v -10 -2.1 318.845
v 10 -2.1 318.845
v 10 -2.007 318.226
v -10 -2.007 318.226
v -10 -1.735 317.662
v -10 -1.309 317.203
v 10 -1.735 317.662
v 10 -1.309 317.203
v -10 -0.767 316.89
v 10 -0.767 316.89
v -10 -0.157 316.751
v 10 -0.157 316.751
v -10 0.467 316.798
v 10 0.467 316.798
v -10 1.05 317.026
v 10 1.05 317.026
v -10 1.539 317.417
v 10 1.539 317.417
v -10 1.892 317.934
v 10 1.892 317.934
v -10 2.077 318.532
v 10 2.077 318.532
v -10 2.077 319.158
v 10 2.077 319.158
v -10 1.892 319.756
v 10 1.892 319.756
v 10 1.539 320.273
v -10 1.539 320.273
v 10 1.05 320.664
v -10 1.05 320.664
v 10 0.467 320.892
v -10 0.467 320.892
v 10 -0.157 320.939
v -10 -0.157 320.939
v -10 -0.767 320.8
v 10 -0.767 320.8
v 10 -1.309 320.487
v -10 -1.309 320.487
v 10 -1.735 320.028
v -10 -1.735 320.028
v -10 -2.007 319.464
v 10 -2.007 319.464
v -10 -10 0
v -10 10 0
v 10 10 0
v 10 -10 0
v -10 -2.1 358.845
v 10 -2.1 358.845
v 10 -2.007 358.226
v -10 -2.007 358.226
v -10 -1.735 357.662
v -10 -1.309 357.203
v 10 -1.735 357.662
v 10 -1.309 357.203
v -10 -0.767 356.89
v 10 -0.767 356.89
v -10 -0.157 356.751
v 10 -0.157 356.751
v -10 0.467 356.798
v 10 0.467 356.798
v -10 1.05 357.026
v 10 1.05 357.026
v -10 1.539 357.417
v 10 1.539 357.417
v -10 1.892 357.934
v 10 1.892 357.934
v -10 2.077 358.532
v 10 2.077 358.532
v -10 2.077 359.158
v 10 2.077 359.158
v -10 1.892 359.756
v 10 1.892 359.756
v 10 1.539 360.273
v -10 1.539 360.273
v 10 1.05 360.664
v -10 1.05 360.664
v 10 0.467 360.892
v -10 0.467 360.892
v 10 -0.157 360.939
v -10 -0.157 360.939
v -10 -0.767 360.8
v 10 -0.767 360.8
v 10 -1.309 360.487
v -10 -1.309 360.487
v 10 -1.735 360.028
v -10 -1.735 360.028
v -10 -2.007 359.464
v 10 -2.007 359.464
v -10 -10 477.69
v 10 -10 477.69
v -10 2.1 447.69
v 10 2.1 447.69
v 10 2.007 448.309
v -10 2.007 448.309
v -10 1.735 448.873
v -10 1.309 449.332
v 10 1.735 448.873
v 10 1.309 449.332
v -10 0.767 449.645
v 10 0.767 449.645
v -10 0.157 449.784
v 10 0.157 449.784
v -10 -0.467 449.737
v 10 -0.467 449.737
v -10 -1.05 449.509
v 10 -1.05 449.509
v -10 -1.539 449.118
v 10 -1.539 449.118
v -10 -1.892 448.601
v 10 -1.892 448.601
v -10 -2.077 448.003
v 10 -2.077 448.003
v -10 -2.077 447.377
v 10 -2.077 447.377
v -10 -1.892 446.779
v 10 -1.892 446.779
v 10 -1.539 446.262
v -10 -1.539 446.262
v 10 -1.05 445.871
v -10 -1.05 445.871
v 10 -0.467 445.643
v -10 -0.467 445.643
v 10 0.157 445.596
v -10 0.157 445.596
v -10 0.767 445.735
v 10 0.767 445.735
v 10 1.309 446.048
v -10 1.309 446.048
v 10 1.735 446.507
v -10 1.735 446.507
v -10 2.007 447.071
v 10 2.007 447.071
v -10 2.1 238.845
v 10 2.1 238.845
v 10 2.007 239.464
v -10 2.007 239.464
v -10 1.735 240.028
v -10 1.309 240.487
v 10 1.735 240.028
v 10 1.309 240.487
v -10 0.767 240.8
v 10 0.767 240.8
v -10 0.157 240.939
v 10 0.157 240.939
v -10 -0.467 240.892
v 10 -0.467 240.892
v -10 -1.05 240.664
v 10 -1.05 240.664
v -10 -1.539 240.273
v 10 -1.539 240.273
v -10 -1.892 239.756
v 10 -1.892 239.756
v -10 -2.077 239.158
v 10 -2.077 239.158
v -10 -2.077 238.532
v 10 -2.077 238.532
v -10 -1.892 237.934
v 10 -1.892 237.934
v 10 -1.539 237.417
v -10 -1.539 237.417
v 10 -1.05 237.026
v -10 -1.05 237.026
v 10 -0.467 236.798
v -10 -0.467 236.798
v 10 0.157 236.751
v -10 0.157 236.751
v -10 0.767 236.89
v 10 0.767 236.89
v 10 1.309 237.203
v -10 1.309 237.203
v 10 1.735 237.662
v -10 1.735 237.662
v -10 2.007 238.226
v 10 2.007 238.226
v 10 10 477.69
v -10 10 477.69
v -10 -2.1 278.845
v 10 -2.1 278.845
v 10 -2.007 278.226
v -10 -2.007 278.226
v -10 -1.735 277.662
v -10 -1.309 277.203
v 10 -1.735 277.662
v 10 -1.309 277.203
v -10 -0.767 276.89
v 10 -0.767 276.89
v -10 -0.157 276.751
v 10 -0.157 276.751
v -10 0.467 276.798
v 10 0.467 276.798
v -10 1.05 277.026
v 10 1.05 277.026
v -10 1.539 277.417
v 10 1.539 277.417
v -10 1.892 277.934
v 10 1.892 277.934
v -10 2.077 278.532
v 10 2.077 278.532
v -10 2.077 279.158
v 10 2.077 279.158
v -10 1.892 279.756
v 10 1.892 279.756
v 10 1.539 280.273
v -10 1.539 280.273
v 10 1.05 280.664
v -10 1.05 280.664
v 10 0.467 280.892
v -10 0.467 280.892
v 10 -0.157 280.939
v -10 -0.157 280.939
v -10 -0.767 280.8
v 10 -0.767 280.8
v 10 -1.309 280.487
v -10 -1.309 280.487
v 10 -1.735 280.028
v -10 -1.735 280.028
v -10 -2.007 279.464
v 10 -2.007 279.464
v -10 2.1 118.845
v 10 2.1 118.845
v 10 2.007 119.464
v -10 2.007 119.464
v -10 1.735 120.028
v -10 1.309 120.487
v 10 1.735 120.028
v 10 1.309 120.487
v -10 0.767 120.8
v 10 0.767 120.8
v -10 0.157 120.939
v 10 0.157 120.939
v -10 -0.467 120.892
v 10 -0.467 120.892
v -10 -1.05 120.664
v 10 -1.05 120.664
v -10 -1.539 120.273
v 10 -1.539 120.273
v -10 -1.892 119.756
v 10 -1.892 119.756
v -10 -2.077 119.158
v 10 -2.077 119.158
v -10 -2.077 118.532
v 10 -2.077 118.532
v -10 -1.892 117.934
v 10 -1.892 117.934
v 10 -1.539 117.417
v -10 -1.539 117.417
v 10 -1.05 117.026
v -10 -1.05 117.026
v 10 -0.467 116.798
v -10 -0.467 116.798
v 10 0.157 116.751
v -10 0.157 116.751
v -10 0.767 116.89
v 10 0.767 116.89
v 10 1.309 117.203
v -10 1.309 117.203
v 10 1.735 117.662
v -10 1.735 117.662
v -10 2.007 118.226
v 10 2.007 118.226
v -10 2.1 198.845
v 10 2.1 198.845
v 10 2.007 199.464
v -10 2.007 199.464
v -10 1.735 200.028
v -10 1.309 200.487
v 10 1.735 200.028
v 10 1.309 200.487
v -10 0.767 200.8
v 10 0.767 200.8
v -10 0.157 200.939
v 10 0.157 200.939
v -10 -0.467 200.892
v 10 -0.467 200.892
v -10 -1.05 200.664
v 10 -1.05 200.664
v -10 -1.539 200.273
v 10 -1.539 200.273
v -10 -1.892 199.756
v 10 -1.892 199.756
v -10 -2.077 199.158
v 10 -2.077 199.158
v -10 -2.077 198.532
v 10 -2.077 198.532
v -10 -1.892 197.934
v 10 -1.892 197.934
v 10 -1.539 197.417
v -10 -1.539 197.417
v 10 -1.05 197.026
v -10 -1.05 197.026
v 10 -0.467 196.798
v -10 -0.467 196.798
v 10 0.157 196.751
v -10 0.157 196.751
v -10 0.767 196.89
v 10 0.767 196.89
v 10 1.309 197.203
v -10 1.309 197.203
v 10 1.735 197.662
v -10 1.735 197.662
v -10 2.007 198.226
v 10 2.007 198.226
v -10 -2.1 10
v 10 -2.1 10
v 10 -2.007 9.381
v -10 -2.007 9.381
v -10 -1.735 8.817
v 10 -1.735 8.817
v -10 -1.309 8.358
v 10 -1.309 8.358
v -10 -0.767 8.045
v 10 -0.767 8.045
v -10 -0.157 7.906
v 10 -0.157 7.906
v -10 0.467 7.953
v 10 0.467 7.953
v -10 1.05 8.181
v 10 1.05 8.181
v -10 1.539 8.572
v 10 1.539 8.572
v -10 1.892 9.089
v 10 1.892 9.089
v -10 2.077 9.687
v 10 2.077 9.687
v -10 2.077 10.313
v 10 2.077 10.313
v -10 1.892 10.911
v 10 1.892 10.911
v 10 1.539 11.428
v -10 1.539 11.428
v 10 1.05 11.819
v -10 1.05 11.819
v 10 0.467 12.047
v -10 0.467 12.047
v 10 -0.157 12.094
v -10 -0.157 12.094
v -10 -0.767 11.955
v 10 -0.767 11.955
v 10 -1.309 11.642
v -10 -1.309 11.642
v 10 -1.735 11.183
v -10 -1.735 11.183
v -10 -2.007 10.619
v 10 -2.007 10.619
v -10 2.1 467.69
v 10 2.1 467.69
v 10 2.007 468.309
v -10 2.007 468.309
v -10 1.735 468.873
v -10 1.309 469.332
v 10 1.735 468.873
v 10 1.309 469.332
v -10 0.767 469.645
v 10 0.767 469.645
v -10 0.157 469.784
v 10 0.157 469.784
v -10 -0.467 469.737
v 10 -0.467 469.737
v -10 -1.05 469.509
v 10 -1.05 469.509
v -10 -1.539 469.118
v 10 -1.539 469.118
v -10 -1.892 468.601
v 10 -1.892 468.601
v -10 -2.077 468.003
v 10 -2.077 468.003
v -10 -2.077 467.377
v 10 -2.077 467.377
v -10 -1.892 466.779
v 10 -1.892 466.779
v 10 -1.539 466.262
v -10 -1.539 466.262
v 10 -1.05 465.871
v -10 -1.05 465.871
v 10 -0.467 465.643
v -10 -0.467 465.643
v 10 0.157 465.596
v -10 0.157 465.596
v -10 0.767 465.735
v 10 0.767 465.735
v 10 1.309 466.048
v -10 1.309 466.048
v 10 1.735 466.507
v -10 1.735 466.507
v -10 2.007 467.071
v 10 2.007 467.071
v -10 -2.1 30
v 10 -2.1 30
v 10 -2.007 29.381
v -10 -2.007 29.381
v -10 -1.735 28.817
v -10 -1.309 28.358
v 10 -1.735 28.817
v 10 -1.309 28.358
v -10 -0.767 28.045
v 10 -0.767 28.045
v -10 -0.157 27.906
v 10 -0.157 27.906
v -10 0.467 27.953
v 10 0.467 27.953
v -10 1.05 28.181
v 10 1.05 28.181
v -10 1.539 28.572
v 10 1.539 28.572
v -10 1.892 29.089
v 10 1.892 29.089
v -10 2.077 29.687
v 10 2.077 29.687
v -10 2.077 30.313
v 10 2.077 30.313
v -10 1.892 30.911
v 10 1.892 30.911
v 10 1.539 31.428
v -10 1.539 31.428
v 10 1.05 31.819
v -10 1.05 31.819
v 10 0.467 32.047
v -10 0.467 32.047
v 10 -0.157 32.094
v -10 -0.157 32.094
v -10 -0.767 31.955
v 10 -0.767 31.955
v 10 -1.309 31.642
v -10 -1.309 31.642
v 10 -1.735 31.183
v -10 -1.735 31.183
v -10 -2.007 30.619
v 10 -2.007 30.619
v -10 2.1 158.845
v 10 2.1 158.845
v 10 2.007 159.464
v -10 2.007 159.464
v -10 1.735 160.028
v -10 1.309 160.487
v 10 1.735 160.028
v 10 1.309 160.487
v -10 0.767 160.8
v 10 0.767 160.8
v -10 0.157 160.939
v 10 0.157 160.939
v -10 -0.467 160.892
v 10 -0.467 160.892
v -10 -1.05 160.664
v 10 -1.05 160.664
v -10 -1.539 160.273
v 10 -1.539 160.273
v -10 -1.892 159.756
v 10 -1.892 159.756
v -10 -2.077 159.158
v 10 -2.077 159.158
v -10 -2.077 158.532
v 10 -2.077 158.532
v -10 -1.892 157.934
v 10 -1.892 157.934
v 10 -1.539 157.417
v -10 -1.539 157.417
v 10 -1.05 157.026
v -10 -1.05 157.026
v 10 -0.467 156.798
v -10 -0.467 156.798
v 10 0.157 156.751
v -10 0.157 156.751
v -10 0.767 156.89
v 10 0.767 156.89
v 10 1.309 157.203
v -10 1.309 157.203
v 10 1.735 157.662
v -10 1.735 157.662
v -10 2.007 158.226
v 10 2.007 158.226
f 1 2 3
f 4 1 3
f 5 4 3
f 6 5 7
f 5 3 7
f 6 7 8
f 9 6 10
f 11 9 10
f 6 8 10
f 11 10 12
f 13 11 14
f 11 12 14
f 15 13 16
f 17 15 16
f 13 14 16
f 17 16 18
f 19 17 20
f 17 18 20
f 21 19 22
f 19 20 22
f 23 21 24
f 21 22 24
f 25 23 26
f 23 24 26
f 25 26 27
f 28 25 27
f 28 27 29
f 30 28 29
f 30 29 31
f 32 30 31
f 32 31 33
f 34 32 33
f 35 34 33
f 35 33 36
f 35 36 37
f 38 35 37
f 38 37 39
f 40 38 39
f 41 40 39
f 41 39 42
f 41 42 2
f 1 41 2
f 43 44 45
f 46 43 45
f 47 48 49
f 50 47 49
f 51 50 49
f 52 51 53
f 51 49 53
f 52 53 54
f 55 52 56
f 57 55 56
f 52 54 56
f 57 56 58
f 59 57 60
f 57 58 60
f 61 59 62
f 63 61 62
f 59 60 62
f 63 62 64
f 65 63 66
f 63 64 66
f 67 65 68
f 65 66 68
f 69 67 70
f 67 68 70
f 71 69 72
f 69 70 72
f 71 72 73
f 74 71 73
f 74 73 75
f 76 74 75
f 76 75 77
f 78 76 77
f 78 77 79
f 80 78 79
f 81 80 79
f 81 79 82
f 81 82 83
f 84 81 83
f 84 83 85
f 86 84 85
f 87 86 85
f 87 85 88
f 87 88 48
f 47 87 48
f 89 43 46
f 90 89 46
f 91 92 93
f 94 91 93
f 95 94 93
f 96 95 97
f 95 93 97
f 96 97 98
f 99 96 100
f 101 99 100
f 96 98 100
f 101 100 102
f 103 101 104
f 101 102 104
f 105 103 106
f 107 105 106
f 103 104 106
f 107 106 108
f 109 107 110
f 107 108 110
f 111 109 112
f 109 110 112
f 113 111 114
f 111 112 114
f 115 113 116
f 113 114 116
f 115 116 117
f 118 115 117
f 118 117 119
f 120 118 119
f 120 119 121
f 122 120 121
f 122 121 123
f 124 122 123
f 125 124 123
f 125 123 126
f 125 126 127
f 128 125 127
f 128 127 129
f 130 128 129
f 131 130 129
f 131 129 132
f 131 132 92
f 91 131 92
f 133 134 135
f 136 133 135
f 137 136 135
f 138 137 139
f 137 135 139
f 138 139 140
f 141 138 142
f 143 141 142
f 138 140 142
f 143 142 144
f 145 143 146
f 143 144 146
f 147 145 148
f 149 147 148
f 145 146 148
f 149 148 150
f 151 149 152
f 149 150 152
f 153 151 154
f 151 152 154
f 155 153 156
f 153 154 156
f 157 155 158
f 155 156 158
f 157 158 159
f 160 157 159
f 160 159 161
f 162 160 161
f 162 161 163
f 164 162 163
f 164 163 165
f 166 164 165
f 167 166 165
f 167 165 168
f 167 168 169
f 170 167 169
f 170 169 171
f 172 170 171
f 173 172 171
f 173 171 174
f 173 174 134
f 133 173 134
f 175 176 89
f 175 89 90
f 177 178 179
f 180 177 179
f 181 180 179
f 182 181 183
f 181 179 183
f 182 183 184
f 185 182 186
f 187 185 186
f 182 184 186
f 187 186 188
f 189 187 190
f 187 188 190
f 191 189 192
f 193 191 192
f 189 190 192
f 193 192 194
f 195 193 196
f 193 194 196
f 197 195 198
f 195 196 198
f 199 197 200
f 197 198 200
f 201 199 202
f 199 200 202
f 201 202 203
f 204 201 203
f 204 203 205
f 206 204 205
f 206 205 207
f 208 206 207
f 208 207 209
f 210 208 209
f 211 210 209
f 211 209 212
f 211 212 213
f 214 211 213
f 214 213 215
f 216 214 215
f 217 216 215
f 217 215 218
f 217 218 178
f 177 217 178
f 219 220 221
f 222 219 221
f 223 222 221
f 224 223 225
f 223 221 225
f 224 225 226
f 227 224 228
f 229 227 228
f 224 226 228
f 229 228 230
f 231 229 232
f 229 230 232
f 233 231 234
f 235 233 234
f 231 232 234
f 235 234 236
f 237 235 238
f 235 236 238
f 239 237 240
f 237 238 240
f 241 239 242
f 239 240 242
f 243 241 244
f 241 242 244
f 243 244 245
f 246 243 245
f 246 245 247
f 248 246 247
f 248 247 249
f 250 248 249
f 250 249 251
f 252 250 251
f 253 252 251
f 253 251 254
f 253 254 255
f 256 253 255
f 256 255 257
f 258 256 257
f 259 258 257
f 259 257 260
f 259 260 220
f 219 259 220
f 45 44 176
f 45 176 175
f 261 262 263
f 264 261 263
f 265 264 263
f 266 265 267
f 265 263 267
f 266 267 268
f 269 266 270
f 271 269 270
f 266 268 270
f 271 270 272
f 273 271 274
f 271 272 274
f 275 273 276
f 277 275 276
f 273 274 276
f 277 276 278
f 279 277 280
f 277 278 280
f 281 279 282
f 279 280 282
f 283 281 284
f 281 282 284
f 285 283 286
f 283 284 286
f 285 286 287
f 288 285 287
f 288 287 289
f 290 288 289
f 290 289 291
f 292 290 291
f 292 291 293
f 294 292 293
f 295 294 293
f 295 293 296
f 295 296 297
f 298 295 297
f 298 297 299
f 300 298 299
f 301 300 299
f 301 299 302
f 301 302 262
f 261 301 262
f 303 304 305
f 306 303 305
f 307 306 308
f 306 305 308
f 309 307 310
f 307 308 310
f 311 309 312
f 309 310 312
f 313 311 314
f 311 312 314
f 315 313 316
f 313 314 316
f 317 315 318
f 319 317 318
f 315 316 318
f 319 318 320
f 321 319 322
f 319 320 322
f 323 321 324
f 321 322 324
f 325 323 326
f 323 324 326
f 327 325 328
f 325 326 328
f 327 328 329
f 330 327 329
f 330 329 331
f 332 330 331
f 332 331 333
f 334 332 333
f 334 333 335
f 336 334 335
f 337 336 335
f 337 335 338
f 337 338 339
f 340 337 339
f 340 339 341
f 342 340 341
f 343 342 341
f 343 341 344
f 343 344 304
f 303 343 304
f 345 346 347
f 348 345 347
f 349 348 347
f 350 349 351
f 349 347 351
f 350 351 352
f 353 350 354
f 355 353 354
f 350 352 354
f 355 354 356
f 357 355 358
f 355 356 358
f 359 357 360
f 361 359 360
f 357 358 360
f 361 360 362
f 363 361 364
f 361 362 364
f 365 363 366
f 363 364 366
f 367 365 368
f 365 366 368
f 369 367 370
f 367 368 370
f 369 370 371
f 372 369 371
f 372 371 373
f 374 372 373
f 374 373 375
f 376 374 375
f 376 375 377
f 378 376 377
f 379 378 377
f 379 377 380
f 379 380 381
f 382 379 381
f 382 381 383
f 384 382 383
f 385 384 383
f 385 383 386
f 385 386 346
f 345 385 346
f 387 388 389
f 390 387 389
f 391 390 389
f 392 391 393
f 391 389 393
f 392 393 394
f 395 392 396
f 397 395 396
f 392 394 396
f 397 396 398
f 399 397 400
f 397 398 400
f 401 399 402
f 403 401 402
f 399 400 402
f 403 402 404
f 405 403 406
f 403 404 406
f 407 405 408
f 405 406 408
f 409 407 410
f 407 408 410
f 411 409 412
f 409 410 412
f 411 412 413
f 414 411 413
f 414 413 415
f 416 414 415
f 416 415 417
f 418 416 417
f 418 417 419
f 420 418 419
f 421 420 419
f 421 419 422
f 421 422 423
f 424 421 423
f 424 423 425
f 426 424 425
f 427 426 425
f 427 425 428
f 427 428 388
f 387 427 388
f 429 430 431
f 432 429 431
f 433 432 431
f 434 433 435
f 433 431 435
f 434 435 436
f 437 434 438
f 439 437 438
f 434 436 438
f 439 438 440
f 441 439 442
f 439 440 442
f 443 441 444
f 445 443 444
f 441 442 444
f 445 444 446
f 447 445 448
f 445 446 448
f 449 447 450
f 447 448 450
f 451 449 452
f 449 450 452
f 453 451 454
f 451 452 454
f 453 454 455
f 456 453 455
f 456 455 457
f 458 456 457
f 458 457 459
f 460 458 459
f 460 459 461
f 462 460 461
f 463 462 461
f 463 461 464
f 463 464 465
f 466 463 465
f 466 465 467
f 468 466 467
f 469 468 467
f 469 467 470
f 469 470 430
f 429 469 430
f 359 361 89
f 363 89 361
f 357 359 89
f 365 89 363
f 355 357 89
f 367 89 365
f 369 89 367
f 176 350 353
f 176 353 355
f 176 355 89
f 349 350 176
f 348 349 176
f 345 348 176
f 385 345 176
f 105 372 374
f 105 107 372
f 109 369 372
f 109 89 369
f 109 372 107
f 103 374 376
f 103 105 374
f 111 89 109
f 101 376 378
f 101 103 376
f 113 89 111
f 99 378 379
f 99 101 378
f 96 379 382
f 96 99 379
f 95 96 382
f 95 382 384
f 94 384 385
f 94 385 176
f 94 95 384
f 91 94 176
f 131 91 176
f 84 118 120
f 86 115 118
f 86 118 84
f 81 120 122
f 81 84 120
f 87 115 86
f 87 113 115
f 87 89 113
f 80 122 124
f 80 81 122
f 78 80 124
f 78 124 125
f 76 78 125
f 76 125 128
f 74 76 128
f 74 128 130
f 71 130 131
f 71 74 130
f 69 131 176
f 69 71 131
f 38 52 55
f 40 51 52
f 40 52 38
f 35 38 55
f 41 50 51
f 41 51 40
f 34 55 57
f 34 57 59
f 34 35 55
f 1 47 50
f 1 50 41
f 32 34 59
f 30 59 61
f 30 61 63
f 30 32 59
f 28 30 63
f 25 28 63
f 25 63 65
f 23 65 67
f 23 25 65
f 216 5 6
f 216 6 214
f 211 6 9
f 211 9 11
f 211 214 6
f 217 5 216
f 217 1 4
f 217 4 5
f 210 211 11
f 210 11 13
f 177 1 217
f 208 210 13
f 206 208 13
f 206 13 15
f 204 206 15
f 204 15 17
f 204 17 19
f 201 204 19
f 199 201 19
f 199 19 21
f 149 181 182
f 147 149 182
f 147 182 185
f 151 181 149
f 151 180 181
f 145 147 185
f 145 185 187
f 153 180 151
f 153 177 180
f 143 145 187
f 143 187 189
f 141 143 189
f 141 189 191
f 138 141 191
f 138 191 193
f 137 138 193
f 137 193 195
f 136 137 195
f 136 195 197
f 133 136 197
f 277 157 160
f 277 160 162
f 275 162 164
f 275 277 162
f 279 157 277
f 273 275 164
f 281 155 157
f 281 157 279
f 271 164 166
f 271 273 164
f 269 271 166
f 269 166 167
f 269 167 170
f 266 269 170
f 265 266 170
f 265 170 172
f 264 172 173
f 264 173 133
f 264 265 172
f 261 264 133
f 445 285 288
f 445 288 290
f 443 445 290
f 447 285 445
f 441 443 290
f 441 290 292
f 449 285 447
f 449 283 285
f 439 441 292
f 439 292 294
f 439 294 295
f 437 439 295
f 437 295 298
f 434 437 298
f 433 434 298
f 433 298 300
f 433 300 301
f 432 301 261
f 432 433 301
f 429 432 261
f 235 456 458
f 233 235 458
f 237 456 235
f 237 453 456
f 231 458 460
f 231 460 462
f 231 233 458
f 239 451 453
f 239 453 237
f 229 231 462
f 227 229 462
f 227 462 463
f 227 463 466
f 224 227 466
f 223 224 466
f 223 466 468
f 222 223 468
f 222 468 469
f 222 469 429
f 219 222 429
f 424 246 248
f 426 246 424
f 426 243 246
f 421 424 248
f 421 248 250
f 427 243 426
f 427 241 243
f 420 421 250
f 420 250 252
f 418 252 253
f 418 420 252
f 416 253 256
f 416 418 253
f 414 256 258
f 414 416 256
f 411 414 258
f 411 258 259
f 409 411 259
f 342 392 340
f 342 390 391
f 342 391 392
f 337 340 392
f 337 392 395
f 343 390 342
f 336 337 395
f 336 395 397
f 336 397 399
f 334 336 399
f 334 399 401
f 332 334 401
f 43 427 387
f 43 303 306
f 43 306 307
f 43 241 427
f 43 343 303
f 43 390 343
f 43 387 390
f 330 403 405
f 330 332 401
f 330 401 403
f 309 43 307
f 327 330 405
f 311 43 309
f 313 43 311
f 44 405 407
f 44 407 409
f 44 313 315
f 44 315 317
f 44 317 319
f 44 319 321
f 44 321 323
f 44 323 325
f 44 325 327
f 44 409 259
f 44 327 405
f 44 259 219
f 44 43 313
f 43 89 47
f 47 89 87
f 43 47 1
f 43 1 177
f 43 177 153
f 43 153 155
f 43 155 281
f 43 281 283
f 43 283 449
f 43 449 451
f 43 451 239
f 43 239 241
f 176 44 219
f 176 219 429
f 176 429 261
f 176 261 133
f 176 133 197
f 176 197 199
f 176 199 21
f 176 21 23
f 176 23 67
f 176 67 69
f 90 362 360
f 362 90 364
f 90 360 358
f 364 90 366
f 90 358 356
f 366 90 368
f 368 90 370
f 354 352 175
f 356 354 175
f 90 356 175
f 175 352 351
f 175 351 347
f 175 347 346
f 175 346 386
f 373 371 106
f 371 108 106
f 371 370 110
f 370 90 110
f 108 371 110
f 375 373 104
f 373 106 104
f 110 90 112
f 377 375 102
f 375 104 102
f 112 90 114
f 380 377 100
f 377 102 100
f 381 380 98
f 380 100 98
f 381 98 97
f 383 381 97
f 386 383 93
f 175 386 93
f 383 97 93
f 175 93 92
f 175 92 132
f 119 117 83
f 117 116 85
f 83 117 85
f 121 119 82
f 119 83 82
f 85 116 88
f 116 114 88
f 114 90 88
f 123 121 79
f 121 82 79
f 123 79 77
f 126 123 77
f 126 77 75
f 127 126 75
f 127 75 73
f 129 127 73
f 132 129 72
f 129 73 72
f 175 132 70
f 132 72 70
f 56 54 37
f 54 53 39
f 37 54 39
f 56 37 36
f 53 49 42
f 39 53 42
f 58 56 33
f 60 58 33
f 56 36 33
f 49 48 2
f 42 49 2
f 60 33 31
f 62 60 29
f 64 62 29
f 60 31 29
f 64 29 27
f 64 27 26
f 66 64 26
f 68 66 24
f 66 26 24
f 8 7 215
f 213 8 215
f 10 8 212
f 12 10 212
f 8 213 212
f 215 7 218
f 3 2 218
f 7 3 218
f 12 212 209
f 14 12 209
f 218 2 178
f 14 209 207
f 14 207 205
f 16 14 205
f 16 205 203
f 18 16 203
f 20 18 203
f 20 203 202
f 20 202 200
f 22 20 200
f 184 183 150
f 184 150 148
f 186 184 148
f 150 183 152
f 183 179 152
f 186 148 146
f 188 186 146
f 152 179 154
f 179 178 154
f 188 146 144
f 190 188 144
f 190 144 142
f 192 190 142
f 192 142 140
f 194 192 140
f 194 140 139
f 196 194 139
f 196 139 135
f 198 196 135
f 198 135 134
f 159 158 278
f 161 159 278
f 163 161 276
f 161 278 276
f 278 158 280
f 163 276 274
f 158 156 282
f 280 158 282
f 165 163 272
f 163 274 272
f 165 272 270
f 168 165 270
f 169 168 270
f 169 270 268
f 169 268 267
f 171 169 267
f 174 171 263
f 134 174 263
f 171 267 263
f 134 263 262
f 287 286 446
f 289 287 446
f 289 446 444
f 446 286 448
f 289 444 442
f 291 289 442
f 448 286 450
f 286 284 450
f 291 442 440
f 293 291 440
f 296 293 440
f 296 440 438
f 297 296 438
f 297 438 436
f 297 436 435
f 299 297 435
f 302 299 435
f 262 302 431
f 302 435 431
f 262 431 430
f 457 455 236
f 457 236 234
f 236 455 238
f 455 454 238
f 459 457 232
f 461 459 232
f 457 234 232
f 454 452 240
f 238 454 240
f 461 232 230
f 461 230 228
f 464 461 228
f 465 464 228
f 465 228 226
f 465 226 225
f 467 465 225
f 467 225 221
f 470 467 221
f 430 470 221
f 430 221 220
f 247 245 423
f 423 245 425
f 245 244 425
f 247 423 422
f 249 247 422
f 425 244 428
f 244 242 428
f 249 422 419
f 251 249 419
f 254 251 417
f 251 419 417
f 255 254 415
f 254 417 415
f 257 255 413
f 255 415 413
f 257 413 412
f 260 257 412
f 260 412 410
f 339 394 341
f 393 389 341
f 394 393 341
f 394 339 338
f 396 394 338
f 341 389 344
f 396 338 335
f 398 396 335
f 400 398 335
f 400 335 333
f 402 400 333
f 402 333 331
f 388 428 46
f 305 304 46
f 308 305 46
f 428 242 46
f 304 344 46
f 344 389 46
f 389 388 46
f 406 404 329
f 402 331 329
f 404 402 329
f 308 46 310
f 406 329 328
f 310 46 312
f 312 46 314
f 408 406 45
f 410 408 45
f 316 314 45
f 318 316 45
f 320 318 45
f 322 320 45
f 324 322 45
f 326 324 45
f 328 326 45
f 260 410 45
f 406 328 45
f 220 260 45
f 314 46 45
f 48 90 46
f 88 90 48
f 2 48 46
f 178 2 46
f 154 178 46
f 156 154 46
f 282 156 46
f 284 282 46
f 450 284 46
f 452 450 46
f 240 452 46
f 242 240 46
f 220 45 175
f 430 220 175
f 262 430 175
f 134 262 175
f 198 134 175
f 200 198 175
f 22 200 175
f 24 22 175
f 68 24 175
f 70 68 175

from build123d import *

# Parameters (mm, degrees)
SKETCH_1_W          = 20
SKETCH_1_H          = 20
EXTRUDE_1_DEPTH     = 477.69
SKETCH_2_R          = 2.1
CUT_EXTRUDE_2_DEPTH = 479.213065589
SKETCH_3_R          = 2.1
CUT_EXTRUDE_3_DEPTH = 479.213065589


with BuildPart() as part:
    # 草图1 → 凸台-拉伸1 (new body)
    with BuildSketch(Plane.XY):
        Rectangle(SKETCH_1_W, SKETCH_1_H)
    extrude(amount=EXTRUDE_1_DEPTH)

    # 草图2 → 切除-拉伸2 (cut, through all)
    with BuildSketch(Plane(origin=(10, 0, 0), x_dir=(0, 0, -1), z_dir=(1, 0, 0))):
        with Locations(Location((-467.69, 0, 0), (0, 0, 90))):
            Circle(SKETCH_2_R)
        with Locations(Location((-447.69, 0, 0), (0, 0, 90))):
            Circle(SKETCH_2_R)
        with Locations(Location((-10, 0, 0), (0, 0, 270))):
            Circle(SKETCH_2_R)
        with Locations(Location((-30, 0, 0), (0, 0, 270))):
            Circle(SKETCH_2_R)
    extrude(amount=-CUT_EXTRUDE_2_DEPTH, mode=Mode.SUBTRACT)

    # 草图3 → 切除-拉伸3 (cut, through all)
    with BuildSketch(Plane(origin=(10, 0, 0), x_dir=(0, 0, -1), z_dir=(1, 0, 0))):
        with Locations(Location((-238.845, 0, 0), (0, 0, 90))):
            Circle(SKETCH_3_R)
        with Locations(Location((-198.845, 0, 0), (0, 0, 90))):
            Circle(SKETCH_3_R)
        with Locations(Location((-158.845, 0, 0), (0, 0, 90))):
            Circle(SKETCH_3_R)
        with Locations(Location((-118.845, 0, 0), (0, 0, 90))):
            Circle(SKETCH_3_R)
        with Locations(Location((-358.845, 0, 0), (0, 0, 270))):
            Circle(SKETCH_3_R)
        with Locations(Location((-318.845, 0, 0), (0, 0, 270))):
            Circle(SKETCH_3_R)
        with Locations(Location((-278.845, 0, 0), (0, 0, 270))):
            Circle(SKETCH_3_R)
    extrude(amount=-CUT_EXTRUDE_3_DEPTH, mode=Mode.SUBTRACT)


solid = part.part
